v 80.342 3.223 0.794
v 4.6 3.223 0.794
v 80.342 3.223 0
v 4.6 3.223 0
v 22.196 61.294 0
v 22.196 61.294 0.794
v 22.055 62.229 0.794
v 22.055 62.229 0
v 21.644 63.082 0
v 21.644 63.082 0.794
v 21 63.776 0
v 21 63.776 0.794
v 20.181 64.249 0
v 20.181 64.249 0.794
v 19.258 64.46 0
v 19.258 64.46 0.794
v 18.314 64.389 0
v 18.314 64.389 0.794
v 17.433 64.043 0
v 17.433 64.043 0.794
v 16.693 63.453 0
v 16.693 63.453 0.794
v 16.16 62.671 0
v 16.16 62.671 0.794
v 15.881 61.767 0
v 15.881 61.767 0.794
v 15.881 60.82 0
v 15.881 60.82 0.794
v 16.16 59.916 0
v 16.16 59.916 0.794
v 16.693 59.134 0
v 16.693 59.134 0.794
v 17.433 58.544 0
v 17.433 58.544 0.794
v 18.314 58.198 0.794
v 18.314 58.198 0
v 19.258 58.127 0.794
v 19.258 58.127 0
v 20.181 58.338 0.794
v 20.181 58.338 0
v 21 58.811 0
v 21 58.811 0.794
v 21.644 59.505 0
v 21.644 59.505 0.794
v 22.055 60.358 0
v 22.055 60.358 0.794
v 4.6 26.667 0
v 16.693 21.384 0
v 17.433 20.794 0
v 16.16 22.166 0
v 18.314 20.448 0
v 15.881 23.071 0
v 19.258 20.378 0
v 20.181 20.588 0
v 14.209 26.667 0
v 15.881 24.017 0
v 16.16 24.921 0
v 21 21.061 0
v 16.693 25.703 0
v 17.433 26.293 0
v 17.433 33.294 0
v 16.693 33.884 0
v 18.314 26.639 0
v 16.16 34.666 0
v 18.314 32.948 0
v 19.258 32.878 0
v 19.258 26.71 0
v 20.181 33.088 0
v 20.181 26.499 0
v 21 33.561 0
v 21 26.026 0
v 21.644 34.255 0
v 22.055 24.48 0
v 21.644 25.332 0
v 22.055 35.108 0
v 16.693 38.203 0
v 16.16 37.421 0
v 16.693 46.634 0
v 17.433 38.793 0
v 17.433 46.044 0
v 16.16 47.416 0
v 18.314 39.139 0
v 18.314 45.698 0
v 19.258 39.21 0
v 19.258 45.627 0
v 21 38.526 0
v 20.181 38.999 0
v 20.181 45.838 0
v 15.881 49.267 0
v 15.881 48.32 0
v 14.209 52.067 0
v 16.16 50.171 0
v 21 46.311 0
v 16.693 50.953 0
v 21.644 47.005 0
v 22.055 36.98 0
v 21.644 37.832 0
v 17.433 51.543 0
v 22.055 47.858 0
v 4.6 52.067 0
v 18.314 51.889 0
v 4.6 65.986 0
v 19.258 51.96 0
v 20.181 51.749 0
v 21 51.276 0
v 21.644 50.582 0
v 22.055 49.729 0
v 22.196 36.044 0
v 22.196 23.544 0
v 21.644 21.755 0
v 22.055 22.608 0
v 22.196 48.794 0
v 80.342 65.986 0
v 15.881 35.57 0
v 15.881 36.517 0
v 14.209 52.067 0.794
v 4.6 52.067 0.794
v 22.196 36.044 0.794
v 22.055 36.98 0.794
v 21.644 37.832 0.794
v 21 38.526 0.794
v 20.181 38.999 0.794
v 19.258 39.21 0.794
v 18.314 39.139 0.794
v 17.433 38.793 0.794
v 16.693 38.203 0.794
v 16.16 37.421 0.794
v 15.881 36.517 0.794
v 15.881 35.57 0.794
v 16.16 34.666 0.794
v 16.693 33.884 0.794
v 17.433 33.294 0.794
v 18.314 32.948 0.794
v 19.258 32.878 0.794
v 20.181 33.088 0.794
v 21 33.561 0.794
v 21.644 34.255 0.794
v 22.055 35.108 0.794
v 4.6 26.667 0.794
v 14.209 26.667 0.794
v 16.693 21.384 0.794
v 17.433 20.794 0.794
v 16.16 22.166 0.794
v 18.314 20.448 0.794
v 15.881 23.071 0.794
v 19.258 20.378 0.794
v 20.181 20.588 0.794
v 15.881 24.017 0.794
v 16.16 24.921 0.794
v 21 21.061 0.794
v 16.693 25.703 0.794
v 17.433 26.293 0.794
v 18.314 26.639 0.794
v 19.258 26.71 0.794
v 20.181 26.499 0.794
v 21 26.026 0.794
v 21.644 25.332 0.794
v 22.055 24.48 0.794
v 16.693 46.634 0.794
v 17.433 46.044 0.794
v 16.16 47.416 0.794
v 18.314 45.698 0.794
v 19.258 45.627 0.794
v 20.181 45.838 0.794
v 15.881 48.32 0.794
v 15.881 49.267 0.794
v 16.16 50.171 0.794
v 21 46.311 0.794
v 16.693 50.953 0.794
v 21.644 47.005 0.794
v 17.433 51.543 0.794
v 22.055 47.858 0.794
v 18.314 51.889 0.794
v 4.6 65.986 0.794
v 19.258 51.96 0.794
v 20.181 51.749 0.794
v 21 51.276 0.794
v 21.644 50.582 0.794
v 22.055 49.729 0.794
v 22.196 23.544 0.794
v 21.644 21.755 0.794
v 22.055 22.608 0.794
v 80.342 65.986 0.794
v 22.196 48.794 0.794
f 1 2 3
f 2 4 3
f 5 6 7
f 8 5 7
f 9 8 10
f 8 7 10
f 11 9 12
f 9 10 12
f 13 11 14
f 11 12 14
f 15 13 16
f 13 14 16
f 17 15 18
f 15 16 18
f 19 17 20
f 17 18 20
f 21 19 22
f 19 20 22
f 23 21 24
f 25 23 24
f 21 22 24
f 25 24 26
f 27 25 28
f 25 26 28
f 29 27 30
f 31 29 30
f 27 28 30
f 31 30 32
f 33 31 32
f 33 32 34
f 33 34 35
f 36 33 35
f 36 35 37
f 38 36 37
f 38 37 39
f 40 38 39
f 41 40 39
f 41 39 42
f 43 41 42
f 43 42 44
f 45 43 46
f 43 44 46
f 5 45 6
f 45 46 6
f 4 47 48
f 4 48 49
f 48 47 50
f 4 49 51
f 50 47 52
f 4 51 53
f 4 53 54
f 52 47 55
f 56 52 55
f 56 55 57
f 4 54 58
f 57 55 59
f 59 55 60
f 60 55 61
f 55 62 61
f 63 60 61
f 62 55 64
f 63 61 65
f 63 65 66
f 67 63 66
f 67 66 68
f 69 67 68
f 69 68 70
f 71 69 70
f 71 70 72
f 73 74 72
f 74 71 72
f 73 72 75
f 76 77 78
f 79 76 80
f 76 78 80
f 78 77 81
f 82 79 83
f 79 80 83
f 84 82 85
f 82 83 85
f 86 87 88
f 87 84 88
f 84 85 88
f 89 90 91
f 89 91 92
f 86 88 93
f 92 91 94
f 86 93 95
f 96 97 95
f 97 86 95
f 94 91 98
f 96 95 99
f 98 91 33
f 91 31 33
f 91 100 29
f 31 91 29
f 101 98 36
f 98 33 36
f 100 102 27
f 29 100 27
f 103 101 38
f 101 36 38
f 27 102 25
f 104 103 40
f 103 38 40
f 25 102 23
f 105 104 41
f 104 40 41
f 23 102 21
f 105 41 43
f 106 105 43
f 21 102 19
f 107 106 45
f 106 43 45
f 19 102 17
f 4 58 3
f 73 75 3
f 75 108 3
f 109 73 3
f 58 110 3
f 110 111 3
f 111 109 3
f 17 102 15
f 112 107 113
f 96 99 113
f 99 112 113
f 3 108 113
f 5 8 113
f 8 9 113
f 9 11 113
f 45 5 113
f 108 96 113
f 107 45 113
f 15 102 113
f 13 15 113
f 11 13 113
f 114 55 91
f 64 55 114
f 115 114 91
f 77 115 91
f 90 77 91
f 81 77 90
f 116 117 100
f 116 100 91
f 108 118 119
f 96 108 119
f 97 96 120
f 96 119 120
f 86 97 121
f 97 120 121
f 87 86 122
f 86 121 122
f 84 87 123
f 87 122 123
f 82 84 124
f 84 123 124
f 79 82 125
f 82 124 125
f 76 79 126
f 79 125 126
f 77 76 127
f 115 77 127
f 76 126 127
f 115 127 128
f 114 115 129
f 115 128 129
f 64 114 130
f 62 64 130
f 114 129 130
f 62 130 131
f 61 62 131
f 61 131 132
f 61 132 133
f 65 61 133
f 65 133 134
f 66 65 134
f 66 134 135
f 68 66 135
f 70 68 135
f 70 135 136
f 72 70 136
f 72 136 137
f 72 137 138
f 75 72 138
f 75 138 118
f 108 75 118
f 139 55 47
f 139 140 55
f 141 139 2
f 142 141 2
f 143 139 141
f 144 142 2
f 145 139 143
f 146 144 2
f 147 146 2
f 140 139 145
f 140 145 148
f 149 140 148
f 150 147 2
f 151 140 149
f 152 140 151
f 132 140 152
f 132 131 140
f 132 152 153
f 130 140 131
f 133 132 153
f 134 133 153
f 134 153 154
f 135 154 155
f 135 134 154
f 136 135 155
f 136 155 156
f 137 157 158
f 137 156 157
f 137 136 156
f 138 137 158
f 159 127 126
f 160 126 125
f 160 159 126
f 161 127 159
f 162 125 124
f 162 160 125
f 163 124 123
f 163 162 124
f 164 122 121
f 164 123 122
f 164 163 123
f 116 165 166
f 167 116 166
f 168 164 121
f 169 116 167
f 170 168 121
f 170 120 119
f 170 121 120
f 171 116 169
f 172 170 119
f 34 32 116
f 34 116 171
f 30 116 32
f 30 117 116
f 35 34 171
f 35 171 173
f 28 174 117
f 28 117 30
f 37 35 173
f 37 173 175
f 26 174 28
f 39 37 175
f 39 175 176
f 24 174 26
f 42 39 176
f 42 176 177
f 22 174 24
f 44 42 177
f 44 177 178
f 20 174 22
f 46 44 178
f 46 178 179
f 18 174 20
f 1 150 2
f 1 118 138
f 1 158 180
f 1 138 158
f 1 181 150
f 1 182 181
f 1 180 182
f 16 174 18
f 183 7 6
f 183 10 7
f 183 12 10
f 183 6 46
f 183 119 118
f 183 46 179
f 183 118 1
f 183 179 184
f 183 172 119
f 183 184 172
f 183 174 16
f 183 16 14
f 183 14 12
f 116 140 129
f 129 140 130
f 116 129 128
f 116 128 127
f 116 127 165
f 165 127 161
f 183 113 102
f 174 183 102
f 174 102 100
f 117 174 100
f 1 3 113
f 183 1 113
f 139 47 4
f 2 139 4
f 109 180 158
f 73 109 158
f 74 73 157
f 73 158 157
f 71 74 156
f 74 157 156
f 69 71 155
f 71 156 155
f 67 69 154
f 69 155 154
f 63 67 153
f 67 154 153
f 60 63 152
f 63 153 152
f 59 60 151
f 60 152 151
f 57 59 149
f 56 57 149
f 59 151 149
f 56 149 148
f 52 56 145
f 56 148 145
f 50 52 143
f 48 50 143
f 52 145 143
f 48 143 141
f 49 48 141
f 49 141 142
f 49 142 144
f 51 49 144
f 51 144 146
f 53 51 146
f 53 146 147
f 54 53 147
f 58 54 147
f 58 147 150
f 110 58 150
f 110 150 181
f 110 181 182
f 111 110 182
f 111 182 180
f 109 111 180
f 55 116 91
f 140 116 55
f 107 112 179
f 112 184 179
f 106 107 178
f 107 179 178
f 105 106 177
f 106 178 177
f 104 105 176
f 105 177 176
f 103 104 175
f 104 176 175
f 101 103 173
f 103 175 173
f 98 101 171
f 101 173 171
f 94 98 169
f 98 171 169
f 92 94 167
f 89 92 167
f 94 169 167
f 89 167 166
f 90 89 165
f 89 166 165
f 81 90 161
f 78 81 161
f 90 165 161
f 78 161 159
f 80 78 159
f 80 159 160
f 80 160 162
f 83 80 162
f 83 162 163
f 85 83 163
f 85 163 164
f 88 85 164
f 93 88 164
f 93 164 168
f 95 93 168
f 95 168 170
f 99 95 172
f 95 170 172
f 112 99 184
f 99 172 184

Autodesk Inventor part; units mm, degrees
ref_plane "YZ Plane" through (0, 0, 0) normal (1, 0, 0) x (0, 1, 0)
ref_plane "XZ Plane" through (0, 0, 0) normal (0, 1, 0) x (-1, 0, 0)
ref_plane "XY Plane" through (0, 0, 0) normal (0, 0, 1) x (1, 0, 0)
sketch "Sketch1" plane through (0, 0, 0) normal (0, 0, 1) x (1, 0, 0)
  line L0 (4.5995, 3.2228) -> (80.3423, 3.2228)
  line L1 (80.3423, 3.2228) -> (80.3423, 65.9862)
  line L2 (80.3423, 65.9862) -> (4.5995, 65.9862)
  line L3 (4.5995, 65.9862) -> (4.5995, 3.2228)
  point P0 (0, 0)
  dimension "d0" = 75.7428
  dimension "d1" = 62.7634
extrude "Extrusion1" add sketch "Sketch1" along normal blind 0.7937
sketch "Sketch4" plane through (0, 0, 0.7937) normal (0, 0, 1) x (1, 0, 0)
  line L0 (4.5995, 3.2228) -> (4.5995, 65.9862) projected
  line L1 (4.5995, 65.9862) -> (80.3423, 65.9862) projected
  line L2 (4.5995, 52.067) -> (14.2094, 52.067)
  line L3 (14.2094, 52.067) -> (14.2094, 26.667)
  line L4 (14.2094, 26.667) -> (4.5995, 26.667)
  line L5 (4.5995, 26.667) -> (4.5995, 52.067)
  point P0 (0, 0)
  dimension "d18" = 13.9192
  dimension "d19" = 25.4
extrude "Extrusion4" cut sketch "Sketch4" against normal through all
sketch "Sketch5" plane through (0, 0, 0.7937) normal (0, 0, 1) x (1, 0, 0)
  line L0 (4.5995, 65.9862) -> (80.3423, 65.9862) projected
  line L1 (4.5995, 52.067) -> (4.5995, 65.9862) projected
  circle A0 centre (19.0208, 61.2935) radius 3.175
  circle A1 centre (19.0208, 48.7936) radius 3.175
  circle A2 centre (19.0208, 36.0437) radius 3.175
  circle A3 centre (19.0208, 23.5438) radius 3.175
  point P0 (0, 0)
  dimension "d20" = 6.35
  dimension "d21" = 14.4213
  dimension "d28" = 12.4999
  dimension "d29" = 12.7499
  dimension "d30" = 12.4999
  dimension "d31" = 4.6927
extrude "Extrusion5" cut sketch "Sketch5" against normal through all
equation "\"d30\" = d28"
properties part number "lcd_standoff"
